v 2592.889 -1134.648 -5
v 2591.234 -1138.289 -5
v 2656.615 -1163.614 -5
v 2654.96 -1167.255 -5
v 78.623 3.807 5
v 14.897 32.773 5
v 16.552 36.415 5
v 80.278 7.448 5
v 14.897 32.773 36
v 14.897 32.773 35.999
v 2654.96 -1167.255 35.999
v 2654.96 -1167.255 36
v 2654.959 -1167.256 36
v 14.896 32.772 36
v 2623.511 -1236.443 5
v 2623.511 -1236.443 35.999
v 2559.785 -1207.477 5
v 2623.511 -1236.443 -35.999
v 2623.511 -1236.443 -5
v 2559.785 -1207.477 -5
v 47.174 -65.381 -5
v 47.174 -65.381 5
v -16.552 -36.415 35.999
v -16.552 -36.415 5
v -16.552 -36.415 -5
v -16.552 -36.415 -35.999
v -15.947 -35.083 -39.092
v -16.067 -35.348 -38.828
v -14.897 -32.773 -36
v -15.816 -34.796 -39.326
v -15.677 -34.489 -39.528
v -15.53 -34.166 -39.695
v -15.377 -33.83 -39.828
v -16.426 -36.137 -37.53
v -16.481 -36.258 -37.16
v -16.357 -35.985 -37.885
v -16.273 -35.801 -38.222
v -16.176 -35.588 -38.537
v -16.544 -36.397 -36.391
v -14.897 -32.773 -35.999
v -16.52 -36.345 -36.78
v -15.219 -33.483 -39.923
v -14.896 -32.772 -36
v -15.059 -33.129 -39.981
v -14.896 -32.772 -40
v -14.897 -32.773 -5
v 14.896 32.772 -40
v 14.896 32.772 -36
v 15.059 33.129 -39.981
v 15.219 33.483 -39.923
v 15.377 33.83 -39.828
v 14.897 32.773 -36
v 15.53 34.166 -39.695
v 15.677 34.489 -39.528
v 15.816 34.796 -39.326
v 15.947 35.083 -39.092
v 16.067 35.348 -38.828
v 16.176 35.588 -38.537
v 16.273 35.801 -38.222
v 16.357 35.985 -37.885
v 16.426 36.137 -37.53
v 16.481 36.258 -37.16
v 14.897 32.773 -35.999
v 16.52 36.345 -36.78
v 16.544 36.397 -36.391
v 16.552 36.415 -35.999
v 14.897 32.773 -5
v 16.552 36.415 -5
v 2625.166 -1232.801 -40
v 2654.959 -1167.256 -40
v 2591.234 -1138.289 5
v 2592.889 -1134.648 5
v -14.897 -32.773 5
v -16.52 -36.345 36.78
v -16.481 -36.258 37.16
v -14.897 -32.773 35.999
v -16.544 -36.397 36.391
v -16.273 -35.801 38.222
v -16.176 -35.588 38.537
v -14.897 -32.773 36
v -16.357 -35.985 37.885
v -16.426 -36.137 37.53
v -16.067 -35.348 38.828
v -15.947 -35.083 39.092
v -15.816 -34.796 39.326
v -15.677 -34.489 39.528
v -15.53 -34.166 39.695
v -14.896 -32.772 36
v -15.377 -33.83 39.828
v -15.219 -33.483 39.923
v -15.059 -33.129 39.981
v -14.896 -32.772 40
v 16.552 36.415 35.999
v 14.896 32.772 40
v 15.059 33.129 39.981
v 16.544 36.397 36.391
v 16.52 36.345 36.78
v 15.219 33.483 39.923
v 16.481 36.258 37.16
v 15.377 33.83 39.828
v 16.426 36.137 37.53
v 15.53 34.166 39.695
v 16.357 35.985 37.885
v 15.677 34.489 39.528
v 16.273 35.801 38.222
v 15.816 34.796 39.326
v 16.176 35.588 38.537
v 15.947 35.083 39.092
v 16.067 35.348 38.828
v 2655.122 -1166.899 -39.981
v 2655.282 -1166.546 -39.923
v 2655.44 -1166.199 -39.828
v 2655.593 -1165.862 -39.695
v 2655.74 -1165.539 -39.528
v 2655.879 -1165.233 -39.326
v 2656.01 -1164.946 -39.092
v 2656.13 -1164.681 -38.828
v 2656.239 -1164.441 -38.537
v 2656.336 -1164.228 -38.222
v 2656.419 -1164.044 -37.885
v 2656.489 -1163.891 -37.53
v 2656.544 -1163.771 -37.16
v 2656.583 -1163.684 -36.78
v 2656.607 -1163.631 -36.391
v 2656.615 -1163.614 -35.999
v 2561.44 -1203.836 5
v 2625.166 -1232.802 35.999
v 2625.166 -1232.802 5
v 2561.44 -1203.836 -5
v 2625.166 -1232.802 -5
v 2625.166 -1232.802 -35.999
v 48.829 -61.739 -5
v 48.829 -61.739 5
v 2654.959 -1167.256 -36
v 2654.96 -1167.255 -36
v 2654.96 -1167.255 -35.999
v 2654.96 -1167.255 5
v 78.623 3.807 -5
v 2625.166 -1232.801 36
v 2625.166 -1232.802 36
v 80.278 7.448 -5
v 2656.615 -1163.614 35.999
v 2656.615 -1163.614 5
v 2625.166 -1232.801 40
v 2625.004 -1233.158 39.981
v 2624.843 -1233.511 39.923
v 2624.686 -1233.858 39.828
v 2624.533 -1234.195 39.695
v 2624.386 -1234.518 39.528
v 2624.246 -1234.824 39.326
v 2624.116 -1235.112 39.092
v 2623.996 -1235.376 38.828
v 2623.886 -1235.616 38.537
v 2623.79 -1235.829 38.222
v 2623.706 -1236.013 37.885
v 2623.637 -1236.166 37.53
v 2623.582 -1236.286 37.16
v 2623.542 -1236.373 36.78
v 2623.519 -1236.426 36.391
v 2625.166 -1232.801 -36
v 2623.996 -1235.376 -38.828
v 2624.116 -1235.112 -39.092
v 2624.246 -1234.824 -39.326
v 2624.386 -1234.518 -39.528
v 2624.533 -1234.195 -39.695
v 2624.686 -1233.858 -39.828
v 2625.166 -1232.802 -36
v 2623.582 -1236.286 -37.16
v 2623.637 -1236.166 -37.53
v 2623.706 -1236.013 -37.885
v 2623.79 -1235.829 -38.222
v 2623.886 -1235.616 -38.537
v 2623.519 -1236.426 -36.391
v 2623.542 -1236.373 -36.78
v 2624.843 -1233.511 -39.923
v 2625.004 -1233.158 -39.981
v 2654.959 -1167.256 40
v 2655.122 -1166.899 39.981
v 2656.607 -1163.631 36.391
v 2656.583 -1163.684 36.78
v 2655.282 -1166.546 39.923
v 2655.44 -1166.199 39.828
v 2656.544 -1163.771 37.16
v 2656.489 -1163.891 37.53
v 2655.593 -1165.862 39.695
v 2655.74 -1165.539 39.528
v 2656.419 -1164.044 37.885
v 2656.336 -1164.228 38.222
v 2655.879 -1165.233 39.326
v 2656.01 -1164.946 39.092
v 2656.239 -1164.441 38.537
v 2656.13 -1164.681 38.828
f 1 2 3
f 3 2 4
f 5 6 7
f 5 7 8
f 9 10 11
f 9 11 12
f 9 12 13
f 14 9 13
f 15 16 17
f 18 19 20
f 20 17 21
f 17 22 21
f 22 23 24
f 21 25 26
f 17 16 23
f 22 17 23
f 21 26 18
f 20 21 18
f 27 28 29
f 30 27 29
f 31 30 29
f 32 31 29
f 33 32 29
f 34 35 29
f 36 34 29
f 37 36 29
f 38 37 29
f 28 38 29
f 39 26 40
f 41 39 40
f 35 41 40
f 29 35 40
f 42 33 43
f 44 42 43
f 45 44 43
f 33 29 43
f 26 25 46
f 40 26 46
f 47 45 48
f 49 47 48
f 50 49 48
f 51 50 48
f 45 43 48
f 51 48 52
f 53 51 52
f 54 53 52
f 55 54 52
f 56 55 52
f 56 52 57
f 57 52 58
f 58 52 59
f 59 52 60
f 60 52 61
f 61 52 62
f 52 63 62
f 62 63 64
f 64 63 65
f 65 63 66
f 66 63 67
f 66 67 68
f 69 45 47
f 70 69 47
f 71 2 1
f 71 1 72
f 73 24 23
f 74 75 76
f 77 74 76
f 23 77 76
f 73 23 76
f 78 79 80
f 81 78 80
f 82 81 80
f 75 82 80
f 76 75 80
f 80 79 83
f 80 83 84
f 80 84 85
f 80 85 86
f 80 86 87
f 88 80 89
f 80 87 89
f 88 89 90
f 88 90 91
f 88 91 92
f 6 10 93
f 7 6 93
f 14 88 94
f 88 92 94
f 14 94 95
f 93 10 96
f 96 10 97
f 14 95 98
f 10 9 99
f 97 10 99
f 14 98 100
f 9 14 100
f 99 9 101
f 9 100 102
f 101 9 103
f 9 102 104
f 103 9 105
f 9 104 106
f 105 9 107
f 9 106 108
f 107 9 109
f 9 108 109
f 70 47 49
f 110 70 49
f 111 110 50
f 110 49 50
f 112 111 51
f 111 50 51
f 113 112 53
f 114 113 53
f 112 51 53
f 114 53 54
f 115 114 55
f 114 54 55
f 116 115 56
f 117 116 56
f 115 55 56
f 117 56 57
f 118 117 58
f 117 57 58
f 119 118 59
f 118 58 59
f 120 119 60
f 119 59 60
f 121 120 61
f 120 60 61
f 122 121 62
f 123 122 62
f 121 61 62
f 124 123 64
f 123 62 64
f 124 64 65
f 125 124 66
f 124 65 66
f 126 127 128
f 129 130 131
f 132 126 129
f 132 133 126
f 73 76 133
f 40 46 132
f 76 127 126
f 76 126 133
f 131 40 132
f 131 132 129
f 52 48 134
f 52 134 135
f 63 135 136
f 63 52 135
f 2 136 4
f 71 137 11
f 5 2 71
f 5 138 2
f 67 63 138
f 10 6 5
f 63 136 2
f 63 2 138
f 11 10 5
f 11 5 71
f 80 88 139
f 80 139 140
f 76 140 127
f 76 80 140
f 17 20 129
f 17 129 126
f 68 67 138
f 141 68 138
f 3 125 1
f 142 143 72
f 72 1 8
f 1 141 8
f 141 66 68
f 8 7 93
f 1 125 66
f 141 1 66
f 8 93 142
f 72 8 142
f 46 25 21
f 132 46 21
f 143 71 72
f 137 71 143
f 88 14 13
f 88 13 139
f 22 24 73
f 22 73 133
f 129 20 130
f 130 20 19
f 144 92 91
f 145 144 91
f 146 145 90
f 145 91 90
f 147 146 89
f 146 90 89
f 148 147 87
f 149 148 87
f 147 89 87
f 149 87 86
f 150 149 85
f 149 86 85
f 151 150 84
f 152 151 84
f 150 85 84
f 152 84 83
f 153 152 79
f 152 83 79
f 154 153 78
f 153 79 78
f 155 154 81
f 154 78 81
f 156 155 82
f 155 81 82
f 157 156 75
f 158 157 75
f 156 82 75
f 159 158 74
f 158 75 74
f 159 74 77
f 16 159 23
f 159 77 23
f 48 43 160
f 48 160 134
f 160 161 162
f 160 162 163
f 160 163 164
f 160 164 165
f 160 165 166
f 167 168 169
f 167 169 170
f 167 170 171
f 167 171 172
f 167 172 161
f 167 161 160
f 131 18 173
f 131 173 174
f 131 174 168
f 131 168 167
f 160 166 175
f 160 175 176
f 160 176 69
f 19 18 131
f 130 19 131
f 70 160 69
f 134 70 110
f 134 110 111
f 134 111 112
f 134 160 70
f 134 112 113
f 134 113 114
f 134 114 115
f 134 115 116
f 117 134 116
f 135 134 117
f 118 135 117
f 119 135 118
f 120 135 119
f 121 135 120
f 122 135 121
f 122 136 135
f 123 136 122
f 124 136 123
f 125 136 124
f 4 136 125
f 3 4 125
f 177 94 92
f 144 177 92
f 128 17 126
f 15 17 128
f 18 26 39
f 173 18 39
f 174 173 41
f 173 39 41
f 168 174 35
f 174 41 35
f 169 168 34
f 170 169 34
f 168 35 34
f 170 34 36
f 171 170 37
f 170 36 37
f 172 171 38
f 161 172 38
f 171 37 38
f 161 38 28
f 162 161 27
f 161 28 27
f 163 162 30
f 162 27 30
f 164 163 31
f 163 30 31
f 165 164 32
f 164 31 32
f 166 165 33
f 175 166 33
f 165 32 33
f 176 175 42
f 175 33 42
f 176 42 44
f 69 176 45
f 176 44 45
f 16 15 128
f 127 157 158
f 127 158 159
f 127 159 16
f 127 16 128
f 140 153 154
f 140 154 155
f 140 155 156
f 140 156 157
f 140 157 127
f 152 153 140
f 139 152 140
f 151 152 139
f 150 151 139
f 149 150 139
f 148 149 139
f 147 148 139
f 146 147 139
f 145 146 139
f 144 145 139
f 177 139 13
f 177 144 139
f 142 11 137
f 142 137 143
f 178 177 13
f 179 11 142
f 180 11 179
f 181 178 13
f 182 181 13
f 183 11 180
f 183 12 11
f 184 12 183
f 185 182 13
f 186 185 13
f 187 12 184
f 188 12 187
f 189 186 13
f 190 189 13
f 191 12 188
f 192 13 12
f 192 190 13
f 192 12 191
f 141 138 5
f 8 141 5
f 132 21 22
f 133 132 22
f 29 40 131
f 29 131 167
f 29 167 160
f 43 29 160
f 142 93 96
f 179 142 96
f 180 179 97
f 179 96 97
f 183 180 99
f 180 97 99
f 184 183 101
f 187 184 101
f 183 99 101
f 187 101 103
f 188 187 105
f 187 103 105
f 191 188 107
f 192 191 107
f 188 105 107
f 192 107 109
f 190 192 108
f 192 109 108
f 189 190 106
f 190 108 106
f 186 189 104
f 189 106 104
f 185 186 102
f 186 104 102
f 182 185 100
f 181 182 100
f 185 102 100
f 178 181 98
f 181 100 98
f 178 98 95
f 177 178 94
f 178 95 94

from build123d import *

# Parameters (mm, degrees)
F_8639_82_80_X_80_X_4_0_1_DEPTH = 2900
SKETCH_3_W                      = 70
SKETCH_3_H                      = 10
CUT_EXTRUDE_1_DEPTH             = 2931.442016311


with BuildPart() as part:
    # Sketch11 → Квадратная труба гост 8639-82 _80 X 80 X 4.0(1) (new body)
    with BuildSketch(Plane(origin=(0, 0, 0), x_dir=(0.4138029443011841, 0.9103664774626047, 0), z_dir=(0.9103664774626047, -0.4138029443011841, 0))):
        with BuildLine():
            Line((-35.999, -40), (35.999, -40))
            ThreePointArc((35.999, -40), (38.828134232, -38.828134232), (40, -35.999))
            Line((40, -35.999), (40, 35.999))
            ThreePointArc((40, 35.999), (38.828134232, 38.828134232), (35.999, 40))
            Line((35.999, 40), (-35.999, 40))
            ThreePointArc((-35.999, 40), (-38.828134232, 38.828134232), (-40, 35.999))
            Line((-40, 35.999), (-40, -35.999))
            ThreePointArc((-40, -35.999), (-38.828134232, -38.828134232), (-35.999, -40))
        make_face()
        with BuildLine():
            Line((-35.999, -36), (35.999, -36))
            ThreePointArc((35.999, -36), (35.999707107, -35.999707107), (36, -35.999))
            Line((36, -35.999), (36, 35.999))
            ThreePointArc((36, 35.999), (35.999707107, 35.999707107), (35.999, 36))
            Line((35.999, 36), (-35.999, 36))
            ThreePointArc((-35.999, 36), (-35.999707107, 35.999707107), (-36, 35.999))
            Line((-36, 35.999), (-36, -35.999))
            ThreePointArc((-36, -35.999), (-35.999707107, -35.999707107), (-35.999, -36))
        make_face(mode=Mode.SUBTRACT)
    extrude(amount=F_8639_82_80_X_80_X_4_0_1_DEPTH)

    # Эскиз3 → Вырез-Вытянуть1 (cut, through all)
    with BuildSketch(Plane(origin=(-16.552117772, -36.414659099, 0), x_dir=(0.9103664774626047, -0.413802944301184, 0), z_dir=(-0.41380294430118403, -0.9103664774626048, 0))):
        with Locations((35, 0)):
            Rectangle(SKETCH_3_W, SKETCH_3_H)
        with Locations((2865, 0)):
            Rectangle(SKETCH_3_W, SKETCH_3_H)
    extrude(amount=-CUT_EXTRUDE_1_DEPTH, mode=Mode.SUBTRACT)


solid = part.part
